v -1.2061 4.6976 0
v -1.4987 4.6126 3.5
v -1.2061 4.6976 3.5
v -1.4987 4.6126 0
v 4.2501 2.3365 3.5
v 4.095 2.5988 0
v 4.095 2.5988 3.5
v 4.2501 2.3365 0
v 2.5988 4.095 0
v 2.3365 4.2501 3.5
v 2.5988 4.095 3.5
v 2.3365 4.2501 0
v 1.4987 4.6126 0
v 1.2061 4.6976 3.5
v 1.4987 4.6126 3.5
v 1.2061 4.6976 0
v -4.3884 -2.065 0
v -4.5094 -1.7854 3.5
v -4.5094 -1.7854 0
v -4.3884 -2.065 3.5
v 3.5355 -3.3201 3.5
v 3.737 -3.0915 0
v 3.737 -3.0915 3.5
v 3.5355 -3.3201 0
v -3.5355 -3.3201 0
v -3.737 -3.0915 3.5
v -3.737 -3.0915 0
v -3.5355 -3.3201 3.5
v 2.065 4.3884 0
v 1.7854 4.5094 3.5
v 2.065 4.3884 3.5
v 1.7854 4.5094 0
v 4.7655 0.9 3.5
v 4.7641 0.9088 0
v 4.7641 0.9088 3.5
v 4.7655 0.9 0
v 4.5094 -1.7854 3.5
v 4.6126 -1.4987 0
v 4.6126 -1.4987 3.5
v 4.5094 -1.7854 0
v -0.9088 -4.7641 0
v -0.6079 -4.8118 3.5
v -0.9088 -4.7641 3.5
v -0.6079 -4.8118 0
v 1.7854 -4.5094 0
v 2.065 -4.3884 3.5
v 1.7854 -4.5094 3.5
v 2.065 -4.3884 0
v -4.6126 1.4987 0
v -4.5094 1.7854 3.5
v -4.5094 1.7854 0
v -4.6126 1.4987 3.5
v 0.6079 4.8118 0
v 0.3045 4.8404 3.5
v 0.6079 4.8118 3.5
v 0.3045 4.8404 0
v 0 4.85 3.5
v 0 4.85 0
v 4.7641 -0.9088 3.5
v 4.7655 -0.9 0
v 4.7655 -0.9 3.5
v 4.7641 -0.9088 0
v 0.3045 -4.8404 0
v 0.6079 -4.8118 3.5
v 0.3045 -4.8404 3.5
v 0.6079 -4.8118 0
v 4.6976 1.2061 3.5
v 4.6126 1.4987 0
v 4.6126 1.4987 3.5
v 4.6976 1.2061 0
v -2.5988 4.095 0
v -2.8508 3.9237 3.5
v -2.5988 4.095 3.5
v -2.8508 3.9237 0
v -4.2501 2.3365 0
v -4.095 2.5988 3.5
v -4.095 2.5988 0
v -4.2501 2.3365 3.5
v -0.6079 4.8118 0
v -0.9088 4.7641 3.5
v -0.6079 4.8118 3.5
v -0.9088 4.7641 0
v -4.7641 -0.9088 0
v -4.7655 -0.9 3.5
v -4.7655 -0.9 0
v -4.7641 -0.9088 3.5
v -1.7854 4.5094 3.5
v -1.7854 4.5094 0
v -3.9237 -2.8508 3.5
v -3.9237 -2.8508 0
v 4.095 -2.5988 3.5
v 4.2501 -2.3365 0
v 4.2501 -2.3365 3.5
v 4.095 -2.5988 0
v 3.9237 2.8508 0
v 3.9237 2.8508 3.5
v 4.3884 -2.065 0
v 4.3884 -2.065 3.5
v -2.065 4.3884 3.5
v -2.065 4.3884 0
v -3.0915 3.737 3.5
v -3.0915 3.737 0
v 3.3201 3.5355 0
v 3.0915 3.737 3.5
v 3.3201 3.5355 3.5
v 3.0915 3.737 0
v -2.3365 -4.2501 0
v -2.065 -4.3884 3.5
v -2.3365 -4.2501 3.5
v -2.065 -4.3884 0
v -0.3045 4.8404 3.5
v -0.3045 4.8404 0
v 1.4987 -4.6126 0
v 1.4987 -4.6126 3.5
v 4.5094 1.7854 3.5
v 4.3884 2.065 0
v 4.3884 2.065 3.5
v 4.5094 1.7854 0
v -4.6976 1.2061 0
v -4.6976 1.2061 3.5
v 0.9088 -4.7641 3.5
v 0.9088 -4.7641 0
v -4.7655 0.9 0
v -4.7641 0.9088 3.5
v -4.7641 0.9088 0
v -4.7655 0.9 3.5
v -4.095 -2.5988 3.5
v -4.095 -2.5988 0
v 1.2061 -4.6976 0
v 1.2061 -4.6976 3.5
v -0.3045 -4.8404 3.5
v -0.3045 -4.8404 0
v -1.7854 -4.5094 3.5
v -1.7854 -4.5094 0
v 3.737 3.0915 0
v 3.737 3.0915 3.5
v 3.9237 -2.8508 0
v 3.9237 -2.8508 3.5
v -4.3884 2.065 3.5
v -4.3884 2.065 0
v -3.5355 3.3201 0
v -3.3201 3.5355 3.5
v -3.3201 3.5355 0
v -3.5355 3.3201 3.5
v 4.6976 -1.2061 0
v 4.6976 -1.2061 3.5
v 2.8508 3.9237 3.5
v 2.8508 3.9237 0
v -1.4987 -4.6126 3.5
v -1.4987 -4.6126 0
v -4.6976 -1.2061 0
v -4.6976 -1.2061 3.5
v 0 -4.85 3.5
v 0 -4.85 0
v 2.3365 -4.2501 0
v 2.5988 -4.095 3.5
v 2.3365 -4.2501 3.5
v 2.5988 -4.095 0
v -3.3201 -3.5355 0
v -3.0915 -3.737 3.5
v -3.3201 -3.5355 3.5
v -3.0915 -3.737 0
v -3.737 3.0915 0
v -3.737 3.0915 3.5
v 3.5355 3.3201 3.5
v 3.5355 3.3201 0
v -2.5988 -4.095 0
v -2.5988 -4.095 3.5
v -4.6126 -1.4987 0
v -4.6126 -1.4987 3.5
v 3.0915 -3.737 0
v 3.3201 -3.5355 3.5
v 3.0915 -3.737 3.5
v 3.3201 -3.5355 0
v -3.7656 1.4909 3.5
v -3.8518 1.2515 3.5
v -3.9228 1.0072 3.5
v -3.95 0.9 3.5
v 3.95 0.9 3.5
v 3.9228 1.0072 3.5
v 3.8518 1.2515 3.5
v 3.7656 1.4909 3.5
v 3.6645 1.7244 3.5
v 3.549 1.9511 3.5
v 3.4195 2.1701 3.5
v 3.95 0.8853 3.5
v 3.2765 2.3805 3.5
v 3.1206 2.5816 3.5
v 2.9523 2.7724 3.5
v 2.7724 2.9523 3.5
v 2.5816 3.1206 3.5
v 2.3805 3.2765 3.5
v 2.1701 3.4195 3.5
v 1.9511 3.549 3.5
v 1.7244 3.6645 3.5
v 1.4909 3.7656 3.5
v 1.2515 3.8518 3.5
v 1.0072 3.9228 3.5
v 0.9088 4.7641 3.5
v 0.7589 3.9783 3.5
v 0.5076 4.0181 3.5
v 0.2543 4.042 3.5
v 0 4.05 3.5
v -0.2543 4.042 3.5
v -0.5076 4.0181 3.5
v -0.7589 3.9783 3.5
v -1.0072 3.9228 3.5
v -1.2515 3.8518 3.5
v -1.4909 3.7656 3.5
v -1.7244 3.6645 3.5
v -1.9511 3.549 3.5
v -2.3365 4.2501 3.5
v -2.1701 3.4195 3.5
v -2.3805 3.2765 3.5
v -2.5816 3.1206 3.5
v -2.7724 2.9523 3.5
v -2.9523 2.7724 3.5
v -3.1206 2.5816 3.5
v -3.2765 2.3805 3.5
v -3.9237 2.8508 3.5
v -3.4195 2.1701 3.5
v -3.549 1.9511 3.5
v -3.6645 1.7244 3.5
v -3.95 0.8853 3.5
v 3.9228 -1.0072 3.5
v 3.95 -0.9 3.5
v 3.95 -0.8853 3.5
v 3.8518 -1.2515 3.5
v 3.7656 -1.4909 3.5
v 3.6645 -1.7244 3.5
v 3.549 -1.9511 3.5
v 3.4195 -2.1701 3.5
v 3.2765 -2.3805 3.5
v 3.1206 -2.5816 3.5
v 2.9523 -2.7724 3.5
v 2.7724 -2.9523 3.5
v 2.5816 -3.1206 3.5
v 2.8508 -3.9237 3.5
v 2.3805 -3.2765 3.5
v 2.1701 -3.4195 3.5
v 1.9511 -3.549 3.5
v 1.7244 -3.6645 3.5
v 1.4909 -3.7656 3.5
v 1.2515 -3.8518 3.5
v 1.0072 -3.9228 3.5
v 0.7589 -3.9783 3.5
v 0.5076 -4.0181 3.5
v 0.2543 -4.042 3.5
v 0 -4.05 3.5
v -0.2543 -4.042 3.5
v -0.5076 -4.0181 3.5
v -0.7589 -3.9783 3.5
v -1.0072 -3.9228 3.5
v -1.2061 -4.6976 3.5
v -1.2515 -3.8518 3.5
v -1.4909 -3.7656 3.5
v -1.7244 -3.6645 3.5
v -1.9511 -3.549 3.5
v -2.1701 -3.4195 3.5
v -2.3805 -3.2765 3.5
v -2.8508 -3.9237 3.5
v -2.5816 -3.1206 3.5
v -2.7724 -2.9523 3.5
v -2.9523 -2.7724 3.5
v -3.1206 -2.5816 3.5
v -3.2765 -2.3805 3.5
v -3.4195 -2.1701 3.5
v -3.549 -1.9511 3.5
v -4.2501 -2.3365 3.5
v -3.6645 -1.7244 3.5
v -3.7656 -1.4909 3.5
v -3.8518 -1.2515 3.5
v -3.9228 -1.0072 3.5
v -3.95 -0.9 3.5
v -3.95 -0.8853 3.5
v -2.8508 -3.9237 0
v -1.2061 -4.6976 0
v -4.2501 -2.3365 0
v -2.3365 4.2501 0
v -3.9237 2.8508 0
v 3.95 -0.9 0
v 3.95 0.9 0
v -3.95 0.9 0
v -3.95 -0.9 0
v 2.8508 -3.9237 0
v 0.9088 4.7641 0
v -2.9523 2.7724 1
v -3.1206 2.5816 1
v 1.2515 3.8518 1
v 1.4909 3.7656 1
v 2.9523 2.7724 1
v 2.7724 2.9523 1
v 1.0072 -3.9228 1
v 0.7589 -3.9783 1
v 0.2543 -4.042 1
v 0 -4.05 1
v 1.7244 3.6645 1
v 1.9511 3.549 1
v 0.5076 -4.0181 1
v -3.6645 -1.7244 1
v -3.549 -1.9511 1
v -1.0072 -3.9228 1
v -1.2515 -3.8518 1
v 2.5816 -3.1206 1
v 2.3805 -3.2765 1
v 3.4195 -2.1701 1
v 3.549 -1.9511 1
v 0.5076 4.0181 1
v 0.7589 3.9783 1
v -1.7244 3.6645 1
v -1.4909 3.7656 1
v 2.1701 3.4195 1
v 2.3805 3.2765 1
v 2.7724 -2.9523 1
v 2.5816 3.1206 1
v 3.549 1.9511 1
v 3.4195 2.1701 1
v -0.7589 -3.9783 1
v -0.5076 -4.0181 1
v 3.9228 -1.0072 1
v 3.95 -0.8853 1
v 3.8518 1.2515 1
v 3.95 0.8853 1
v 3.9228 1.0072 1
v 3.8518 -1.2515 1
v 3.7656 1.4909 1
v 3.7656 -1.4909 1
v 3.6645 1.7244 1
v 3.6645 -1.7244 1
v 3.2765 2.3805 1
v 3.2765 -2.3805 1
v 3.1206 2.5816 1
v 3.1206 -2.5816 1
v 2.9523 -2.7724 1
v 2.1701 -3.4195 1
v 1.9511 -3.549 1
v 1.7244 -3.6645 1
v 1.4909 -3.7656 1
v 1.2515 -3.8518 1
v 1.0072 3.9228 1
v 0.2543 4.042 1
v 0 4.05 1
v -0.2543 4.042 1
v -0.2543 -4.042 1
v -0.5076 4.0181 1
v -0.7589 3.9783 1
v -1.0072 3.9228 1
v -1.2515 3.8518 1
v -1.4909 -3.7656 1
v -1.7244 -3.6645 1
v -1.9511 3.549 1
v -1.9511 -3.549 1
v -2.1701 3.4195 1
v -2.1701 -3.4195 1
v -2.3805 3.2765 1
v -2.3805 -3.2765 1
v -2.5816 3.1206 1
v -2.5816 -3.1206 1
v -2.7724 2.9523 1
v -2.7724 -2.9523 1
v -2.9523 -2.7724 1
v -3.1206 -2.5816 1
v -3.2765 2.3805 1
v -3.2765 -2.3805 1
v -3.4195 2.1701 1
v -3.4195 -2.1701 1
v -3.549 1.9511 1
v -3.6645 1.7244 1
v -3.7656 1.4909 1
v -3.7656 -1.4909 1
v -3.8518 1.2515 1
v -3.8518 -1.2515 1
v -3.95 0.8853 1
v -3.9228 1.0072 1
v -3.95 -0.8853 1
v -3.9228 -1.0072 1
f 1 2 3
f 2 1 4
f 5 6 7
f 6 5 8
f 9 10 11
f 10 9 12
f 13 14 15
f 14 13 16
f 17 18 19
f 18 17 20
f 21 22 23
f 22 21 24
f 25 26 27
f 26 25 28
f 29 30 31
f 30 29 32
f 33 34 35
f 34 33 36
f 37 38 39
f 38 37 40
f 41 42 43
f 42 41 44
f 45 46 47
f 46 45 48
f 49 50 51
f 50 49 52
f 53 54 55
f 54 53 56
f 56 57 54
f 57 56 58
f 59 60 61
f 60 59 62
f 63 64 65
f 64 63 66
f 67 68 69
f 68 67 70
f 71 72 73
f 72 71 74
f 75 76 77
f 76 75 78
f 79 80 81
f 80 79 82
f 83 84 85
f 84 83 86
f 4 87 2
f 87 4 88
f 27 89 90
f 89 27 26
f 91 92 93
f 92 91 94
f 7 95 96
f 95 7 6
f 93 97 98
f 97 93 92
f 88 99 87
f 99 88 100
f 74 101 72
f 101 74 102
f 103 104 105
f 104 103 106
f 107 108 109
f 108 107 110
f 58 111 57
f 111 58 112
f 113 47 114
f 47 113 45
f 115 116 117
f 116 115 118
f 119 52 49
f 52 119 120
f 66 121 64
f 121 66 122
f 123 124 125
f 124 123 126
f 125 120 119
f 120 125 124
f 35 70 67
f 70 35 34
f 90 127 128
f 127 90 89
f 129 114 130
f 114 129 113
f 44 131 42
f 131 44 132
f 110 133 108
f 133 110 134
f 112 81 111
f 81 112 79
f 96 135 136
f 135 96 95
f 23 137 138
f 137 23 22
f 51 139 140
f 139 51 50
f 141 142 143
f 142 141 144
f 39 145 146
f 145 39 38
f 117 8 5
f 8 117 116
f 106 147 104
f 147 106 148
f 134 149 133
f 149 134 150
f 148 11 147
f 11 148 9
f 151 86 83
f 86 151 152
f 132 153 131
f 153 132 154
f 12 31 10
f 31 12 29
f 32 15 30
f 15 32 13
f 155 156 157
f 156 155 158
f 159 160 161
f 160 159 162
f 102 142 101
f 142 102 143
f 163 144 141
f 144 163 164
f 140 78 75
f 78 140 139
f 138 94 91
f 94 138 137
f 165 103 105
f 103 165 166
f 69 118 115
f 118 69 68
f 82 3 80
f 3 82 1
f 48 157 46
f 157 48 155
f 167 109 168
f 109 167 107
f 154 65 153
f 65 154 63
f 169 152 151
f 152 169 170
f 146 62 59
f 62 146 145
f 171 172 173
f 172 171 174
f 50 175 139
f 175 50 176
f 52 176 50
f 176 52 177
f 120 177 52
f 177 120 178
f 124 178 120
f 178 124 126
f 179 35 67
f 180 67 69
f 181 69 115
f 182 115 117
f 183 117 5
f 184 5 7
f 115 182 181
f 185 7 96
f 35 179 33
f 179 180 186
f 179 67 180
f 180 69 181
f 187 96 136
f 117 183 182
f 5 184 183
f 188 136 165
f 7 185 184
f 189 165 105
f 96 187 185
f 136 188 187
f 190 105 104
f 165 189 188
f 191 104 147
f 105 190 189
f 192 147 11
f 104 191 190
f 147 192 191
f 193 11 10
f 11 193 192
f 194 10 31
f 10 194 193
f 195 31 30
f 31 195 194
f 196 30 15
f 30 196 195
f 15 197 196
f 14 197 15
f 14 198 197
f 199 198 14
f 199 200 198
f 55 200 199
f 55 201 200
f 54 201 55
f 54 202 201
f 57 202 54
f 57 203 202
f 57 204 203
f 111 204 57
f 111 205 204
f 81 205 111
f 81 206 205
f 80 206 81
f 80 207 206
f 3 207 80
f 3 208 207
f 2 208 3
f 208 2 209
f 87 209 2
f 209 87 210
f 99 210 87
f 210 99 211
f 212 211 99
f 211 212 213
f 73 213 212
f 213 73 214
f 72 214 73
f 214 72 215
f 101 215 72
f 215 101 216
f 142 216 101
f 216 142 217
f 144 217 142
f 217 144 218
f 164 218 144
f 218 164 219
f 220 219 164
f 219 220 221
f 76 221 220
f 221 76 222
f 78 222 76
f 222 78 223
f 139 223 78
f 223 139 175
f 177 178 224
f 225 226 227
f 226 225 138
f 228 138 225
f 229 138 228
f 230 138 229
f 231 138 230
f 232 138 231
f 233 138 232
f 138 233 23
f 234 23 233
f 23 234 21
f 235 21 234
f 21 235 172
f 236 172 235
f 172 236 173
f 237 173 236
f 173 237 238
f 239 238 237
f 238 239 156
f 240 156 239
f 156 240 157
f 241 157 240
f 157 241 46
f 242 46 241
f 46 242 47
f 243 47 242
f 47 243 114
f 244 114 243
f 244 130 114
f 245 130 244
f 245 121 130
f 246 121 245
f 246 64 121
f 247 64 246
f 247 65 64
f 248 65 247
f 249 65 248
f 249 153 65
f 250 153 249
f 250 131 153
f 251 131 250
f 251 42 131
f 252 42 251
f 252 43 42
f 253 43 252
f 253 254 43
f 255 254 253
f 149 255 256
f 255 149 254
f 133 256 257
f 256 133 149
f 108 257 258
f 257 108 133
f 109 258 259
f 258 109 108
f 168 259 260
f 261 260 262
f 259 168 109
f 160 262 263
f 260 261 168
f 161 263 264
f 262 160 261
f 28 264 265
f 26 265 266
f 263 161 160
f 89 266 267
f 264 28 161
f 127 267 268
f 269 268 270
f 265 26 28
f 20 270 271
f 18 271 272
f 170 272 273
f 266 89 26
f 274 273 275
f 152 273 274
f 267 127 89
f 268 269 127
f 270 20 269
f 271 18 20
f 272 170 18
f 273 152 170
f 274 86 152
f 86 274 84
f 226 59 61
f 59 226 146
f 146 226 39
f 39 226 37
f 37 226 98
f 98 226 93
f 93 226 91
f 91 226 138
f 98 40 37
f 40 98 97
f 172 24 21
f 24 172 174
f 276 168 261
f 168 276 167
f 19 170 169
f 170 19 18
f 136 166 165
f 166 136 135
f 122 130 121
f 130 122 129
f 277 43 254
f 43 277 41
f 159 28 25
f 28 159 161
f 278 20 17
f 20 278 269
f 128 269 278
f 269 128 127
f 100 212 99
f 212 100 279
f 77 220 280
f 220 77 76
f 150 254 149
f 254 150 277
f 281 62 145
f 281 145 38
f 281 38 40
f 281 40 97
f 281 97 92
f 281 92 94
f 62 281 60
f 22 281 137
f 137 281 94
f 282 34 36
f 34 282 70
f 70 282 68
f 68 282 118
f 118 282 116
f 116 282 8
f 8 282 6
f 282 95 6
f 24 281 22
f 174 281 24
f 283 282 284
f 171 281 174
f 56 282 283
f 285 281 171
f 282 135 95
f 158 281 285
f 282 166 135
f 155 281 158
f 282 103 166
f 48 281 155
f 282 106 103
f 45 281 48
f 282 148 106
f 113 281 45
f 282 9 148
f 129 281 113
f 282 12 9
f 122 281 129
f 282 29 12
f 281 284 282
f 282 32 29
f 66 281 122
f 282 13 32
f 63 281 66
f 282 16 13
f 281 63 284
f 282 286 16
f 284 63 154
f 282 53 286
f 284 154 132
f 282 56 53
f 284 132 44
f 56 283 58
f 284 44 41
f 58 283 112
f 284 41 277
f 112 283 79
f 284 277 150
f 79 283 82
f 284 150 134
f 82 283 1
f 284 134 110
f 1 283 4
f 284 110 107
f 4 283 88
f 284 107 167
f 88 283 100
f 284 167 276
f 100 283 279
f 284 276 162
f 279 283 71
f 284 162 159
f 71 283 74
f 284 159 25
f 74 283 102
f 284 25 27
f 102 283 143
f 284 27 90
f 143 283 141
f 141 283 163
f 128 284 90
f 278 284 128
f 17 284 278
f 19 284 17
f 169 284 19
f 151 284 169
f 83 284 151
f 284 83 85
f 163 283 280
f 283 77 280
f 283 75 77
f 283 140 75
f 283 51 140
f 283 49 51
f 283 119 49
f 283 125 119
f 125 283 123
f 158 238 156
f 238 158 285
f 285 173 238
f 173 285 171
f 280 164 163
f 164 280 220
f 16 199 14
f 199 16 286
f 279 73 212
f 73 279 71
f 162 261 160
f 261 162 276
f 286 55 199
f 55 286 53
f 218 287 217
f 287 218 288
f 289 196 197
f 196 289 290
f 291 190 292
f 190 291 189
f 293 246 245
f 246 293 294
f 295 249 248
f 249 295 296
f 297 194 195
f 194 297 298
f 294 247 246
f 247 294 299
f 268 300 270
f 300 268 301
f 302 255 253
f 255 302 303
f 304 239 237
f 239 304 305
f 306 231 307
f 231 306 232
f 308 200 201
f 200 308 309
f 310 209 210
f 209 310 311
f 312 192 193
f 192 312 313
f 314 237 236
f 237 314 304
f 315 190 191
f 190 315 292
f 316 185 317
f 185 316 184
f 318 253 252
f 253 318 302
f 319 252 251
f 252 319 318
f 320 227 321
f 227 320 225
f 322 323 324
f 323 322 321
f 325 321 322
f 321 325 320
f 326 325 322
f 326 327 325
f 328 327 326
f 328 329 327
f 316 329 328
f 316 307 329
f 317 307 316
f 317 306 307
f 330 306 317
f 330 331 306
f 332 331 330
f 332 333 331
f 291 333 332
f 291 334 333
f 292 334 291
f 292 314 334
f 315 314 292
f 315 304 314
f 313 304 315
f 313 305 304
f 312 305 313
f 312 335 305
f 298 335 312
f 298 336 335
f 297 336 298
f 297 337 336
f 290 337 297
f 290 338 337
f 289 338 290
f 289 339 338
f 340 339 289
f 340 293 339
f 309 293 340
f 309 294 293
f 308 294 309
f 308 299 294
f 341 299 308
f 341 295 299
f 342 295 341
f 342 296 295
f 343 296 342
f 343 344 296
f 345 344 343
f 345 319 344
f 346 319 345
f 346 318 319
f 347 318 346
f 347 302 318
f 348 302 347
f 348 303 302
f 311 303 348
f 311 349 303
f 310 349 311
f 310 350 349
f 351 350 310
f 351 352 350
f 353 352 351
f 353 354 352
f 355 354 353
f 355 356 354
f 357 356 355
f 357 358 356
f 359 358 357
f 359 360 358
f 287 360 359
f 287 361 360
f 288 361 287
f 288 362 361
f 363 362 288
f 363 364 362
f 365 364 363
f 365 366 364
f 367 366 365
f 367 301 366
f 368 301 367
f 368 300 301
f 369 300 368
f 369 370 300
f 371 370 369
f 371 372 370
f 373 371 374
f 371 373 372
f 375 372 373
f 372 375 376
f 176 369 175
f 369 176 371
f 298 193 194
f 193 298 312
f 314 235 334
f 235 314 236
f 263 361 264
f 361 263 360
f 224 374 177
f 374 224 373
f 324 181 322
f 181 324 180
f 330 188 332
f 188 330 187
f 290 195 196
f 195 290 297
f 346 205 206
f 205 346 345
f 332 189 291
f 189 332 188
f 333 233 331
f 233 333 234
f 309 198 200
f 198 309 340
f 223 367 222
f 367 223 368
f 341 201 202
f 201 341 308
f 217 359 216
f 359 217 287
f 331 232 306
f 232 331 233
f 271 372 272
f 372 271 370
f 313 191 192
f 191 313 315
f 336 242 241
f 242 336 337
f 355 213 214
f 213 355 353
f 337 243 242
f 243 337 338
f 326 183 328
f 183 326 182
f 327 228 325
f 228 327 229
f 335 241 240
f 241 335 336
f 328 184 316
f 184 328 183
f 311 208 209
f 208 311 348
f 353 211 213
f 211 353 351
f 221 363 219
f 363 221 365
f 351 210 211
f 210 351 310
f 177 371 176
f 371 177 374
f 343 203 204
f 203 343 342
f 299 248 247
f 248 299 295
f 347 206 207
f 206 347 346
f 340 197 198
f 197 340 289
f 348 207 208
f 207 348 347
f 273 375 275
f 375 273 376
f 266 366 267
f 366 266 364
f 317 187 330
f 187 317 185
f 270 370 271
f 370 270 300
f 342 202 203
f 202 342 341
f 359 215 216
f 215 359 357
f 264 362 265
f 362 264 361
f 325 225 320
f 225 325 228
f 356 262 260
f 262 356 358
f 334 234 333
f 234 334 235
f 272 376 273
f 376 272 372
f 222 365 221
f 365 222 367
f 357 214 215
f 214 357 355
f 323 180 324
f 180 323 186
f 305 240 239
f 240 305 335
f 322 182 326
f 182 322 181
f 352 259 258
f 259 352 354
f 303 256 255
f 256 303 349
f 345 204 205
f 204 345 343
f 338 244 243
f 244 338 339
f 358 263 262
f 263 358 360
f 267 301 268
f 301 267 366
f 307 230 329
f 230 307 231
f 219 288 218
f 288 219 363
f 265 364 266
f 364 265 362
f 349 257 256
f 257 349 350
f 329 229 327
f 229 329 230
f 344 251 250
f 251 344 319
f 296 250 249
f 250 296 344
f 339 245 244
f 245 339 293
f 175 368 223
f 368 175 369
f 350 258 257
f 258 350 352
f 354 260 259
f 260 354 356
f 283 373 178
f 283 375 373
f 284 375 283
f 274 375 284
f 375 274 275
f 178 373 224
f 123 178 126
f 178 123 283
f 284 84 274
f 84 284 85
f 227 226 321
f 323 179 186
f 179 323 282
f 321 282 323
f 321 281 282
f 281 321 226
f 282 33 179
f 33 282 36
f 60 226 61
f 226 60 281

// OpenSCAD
use <MCAD/boxes.scad>

// box setup
bb_size = 15;
space_uv_w = 220;
space_uv_h = 160;
space_uv_z = 110;
space_ec_w = 75;
mh_pitch = 15;
cover_frame_size = 2;

// mount holes
mh_inner_dia = 3;
mh_out_dia = 10;
mh_out_h = 3.5;
mh_x_positions = [1, 2, 3, 4, 5, 7.2, 8.2, 9.2, 10.2, 11.2, 12.2, 13.2, 14.35, 15.5, 16.5, 17.5, 18.5, 19.5, 20.5];
mh_y_positions = [1, 2, 3, 4, 5, 6, 7, 8, 9, 10, 11];

top_cover_z = 25;
top_cover_plate_z = 4;


total_w = space_uv_w+space_ec_w+3*bb_size;
total_h = space_uv_h+2*bb_size;
total_z = space_uv_z+top_cover_z+2*bb_size;


//bottom_plate(1);
//translate([0, 0, bb_size+2]) bottom_plate(-1);

//translate([total_w/2-bb_size, total_h/-2, bb_size/-2]) right_zbar();
//translate([total_w/-2+space_ec_w+bb_size, total_h/-2, -bb_size/2]) middle_zbar();
//translate([total_w/-2+space_ec_w+bb_size, total_h/2, -bb_size/2]) mirror([0, 1, 0]) middle_zbar();

//translate([total_w/-2, total_h/-2, bb_size/-2]) left_zbar();

//translate([total_w/-2+(space_ec_w+2*bb_size)/2, 0, total_z-bb_size]) top_plate();

//translate([0, 0, total_z-top_cover_z-bb_size+1]) uv_plate();
//translate([0, 0, total_z-top_cover_z-bb_size+1]) uv_plate(2);

//translate([-19.5, total_h/2+0.1, total_z-top_cover_z-bb_size/2+5.1]) rotate(a=[0, 90, 90]) import("test_hinge.stl");

//hinge_washer();

mount_hole_cover();

module mount_hole_cover() {
    difference() {
        cylinder(d=mh_out_dia-0.3, h=mh_out_h, $fn=100);
        translate([0, 0, 1]) cylinder(d=mh_out_dia-0.3-1.6, h=mh_out_h, $fn=100);
        translate([(mh_out_dia-0.3)/-2, 0, 0]) cube(size=[1.8, 1.8, mh_out_h*3], center=true);
        translate([(mh_out_dia-0.3)/2, 0, 0]) cube(size=[1.8, 1.8, mh_out_h*3], center=true);

    }
}

module hinge_washer() {
    hinge_w = 30;
    hinge_d = 4;
    washer_d = bb_size/2-hinge_d;
    hinge_down_cutoff = 2;

    difference() {        
        union() {
            cube(size=[hinge_w, bb_size, washer_d]);
            cube(size=[hinge_w, hinge_down_cutoff, bb_size/2]);
            translate([0, -cover_frame_size, bb_size/2-cover_frame_size]) cube(size=[hinge_w, cover_frame_size+hinge_down_cutoff, cover_frame_size]);
        }

        translate([hinge_w/2-mh_pitch/2, bb_size/2, -1]) cylinder(d=3.5, h=washer_d+2, $fn=100);
        translate([hinge_w/2+mh_pitch/2, bb_size/2, -1]) cylinder(d=3.5, h=washer_d+2, $fn=100);

    }
}

module uv_plate(cut_side=1) {
    uvp_w = space_uv_w + 2*bb_size;

    difference() {
        translate([space_ec_w/2+bb_size/2, 0, 0]) difference() {
            union() {
                cube(size=[uvp_w, total_h, bb_size], center=true);
                // cover frames
                translate([0, total_h/-2+cover_frame_size/2, cover_frame_size/-2]) cube(size=[uvp_w, cover_frame_size, bb_size+cover_frame_size], center=true);
                translate([0, total_h/2-cover_frame_size/2, cover_frame_size/-2]) cube(size=[uvp_w, cover_frame_size, bb_size+cover_frame_size], center=true);
                translate([uvp_w/2-cover_frame_size/2, 0, cover_frame_size/-2]) cube(size=[cover_frame_size, total_h, bb_size+cover_frame_size], center=true);

            }
            cube(size=[space_uv_w, space_uv_h, bb_size+2], center=true);
        }

        // mounting holes              
        for (i = mh_x_positions) {
            translate([total_w/-2 + mh_out_dia/2 + i*mh_pitch, total_h/-2+bb_size+1, 0]) rotate(a=[90, 0, 0]) mounting_hole();
            translate([total_w/-2 + mh_out_dia/2 + i*mh_pitch, total_h/2+1, 0]) rotate(a=[90, 0, 0]) mounting_hole();
        }
        for (i = mh_y_positions) {
            translate([total_w/-2-1, total_h/-2+mh_out_dia/2 + i*mh_pitch, 0]) rotate(a=[90, 0, 90]) mounting_hole();
            translate([total_w/-2-1+bb_size+space_ec_w, total_h/-2+mh_out_dia/2 + i*mh_pitch, 0]) rotate(a=[90, 0, 90]) mounting_hole();
            translate([total_w/2-1-bb_size, total_h/-2+mh_out_dia/2 + i*mh_pitch, 0]) rotate(a=[90, 0, 90]) mounting_hole();
        }

        // cut corners
        translate([17*mh_pitch+mh_out_dia/2-0.5, total_h/2, 0]) cube(size=[total_w, bb_size, bb_size+10], center=true); 
        translate([19*mh_pitch+mh_out_dia/2-0.5, total_h/-2, 0]) cube(size=[total_w, bb_size, bb_size+10], center=true); 
        zbar_h = 2.5*mh_pitch + mh_out_dia/2;
        translate([total_w/2, total_h/-2+zbar_h/2-1]) cube(size=[bb_size, zbar_h+2, bb_size+5], center=true);
        translate([total_w/2, total_h/2-zbar_h/2+1]) cube(size=[bb_size, zbar_h+2, bb_size+5], center=true);
        lp_cut_w = 7.2*mh_pitch + 0.5*mh_pitch + mh_out_dia/2;
        translate([total_w/-2+lp_cut_w/2, total_h/-2, 0]) cube(size=[lp_cut_w, bb_size, bb_size+5], center=true);
        translate([total_w/-2+lp_cut_w/2, total_h/2, 0]) cube(size=[lp_cut_w, bb_size, bb_size+5], center=true);
        lp_cut_h = 1.5*mh_pitch + mh_out_dia/2+0.5;
        translate([total_w/-2+bb_size+space_ec_w, total_h/-2+lp_cut_h/2, 0]) cube(size=[bb_size, lp_cut_h, bb_size+5], center=true);
        translate([total_w/-2+bb_size+space_ec_w, total_h/2-lp_cut_h/2, 0]) cube(size=[bb_size, lp_cut_h, bb_size+5], center=true);
        // left hinge
        hinge_w = 2*mh_pitch+1;
        translate([total_w/-2+hinge_w/2+(8.2+0.5)*mh_pitch+mh_out_dia/2-0.5, total_h/2, 0]) cube(size=[hinge_w, bb_size, bb_size+5], center=true);

        // cut sides
        if (cut_side==1) {
            translate([(15.5+0.5)*mh_pitch+mh_out_dia/2, 0, 0]) cube(size=[total_w, total_h+2, bb_size+10], center=true);
            translate([(12.2+0.5)*mh_pitch+mh_out_dia/2-0.5, total_h/-2, 0]) cube(size=[total_w, bb_size, bb_size+10], center=true);
            translate([(12.2+0.5)*mh_pitch+mh_out_dia/2-0.5, total_h/2, 0]) cube(size=[total_w, bb_size, bb_size+10], center=true);
        }
        else {
            left_w = (12.2+0.5)*mh_pitch+mh_out_dia/2;
            translate([total_w/-2+left_w/2, 0, 0]) cube(size=[left_w, total_h+2, bb_size+10], center=true);
            translate([(total_w-((15.5+0.5)*mh_pitch+mh_out_dia/2))*-1+0.5, total_h/-2+bb_size, 0]) cube(size=[total_w, bb_size, bb_size+10], center=true);
            translate([(total_w-((15.5+0.5)*mh_pitch+mh_out_dia/2))*-1+0.5, total_h/+2-bb_size, 0]) cube(size=[total_w, bb_size, bb_size+10], center=true);

        }
    }
}

module top_plate() {
    tp_w = space_ec_w + 2*bb_size;
    difference() {
        union() {
            difference() {
                union() {
                    cube(size=[tp_w, total_h, bb_size], center=true);
                    // cover frames
                    translate([0, total_h/-2+cover_frame_size/2, cover_frame_size/-2]) cube(size=[tp_w, cover_frame_size, bb_size+cover_frame_size], center=true);
                    translate([0, total_h/2-cover_frame_size/2, cover_frame_size/-2]) cube(size=[tp_w, cover_frame_size, bb_size+cover_frame_size], center=true);
                    translate([tp_w/-2+cover_frame_size/2, 0, cover_frame_size/-2]) cube(size=[cover_frame_size, total_h, bb_size+cover_frame_size], center=true);
                    translate([tp_w/2-cover_frame_size/2, 0, cover_frame_size/-2]) cube(size=[cover_frame_size, total_h, bb_size+cover_frame_size], center=true);

                }
                cube(size=[space_ec_w, space_uv_h, bb_size+2], center=true);

                // mount holes
                for (i = mh_x_positions) {
                    translate([tp_w/-2 + mh_out_dia/2 + i*mh_pitch, total_h/-2+bb_size+1, 0]) rotate(a=[90, 0, 0]) mounting_hole();
                    translate([tp_w/-2 + mh_out_dia/2 + i*mh_pitch, total_h/2+1, 0]) rotate(a=[90, 0, 0]) mounting_hole();
                }
                for (i = mh_y_positions) {
                    translate([tp_w/-2-1, total_h/-2+mh_out_dia/2 + i*mh_pitch, 0]) rotate(a=[90, 0, 90]) mounting_hole();
                    translate([tp_w/-2-1+bb_size+space_ec_w, total_h/-2+mh_out_dia/2 + i*mh_pitch, 0]) rotate(a=[90, 0, 90]) mounting_hole();            
                }
            }
            // top cover frames
            translate([0, total_h/-2+bb_size/2+cover_frame_size/2, bb_size/2-cover_frame_size/2]) cube(size=[tp_w, bb_size+cover_frame_size, cover_frame_size], center=true);
            translate([0, total_h/2-bb_size/2-cover_frame_size/2, bb_size/2-cover_frame_size/2]) cube(size=[tp_w, bb_size+cover_frame_size, cover_frame_size], center=true);
            translate([tp_w/-2+bb_size/2+cover_frame_size/2, 0, bb_size/2-cover_frame_size/2]) cube(size=[bb_size+cover_frame_size, total_h, cover_frame_size], center=true);
            translate([tp_w/2-bb_size/2-cover_frame_size/2, 0, bb_size/2-cover_frame_size/2]) cube(size=[bb_size+cover_frame_size, total_h, cover_frame_size], center=true);

        }

        // cut outs
        // left
        l_w = 2.5*mh_pitch+mh_out_dia/2;
        l_h = 2.5*mh_pitch + mh_out_dia/2;
        translate([tp_w/-2+(l_w+1)/2-1, total_h/-2, 0]) cube(size=[l_w+1, bb_size, bb_size+5], center=true); 
        translate([tp_w/-2+(l_w+1)/2-1, total_h/2, 0]) cube(size=[l_w+1, bb_size, bb_size+5], center=true); 
        translate([tp_w/-2, total_h/-2+(l_h+1)/2-1, 0]) cube(size=[bb_size, l_h+1, bb_size+5], center=true);
        translate([tp_w/-2, total_h/2-(l_h+1)/2+1, 0]) cube(size=[bb_size, l_h+1, bb_size+5], center=true);
        // right
        uvec_zbar_w = 2.2*mh_pitch+1.5*mh_out_dia;
        translate([tp_w/-2+uvec_zbar_w/2+5*mh_pitch-mh_out_dia/4, total_h/-2+(bb_size/2+1)/2-1, 0]) cube(size=[uvec_zbar_w, bb_size/2+1, bb_size+5], center=true);
        translate([tp_w/-2+uvec_zbar_w/2+5*mh_pitch-mh_out_dia/4, total_h/2-(bb_size/2+1)/2+1, 0]) cube(size=[uvec_zbar_w, bb_size/2+1, bb_size+5], center=true);
        r_h = 1.5*mh_pitch+mh_out_dia/2+0.5;
        translate([tp_w/2, total_h/-2 + r_h/2, 0]) cube(size=[bb_size, r_h, bb_size+5], center=true);
        translate([tp_w/2, total_h/2 - r_h/2, 0]) cube(size=[bb_size, r_h, bb_size+5], center=true);
        // tamper switch
        ts_w = 3*mh_pitch;
        translate([tp_w/2-bb_size, total_h/-2+ts_w/2+2.5*mh_pitch+mh_out_dia/2, 0]) cube(size=[bb_size, ts_w, bb_size+5], center=true);
    }
}

module left_zbar() {
    zbar_w = 2.5*mh_pitch+mh_out_dia/2 - 0.5;
    zbar_h = 2.5*mh_pitch + mh_out_dia/2 - 0.5;
    
    difference() {   
        // base shape
        union() {
            cube(size=[bb_size, bb_size, total_z]);
            cube(size=[zbar_w, bb_size, bb_size]);
            cube(size=[bb_size, zbar_h, bb_size]);
            translate([0, 0, total_z-bb_size]) cube(size=[zbar_w, bb_size, bb_size]);
            translate([0, 0, total_z-bb_size]) cube(size=[bb_size, zbar_h, bb_size]);
            
            // cover frames
            // front
            cube(size=[zbar_w, cover_frame_size, cover_frame_size+bb_size]);
            cube(size=[bb_size+cover_frame_size, cover_frame_size, total_z]);
            translate([0, 0, total_z-bb_size-cover_frame_size]) cube(size=[zbar_w, cover_frame_size, bb_size+cover_frame_size]);
            // side
            cube(size=[cover_frame_size, zbar_h, bb_size+cover_frame_size]);
            cube(size=[cover_frame_size, bb_size+cover_frame_size, total_z]);
            translate([0, 0, total_z-bb_size-cover_frame_size]) cube(size=[cover_frame_size, zbar_h, bb_size+cover_frame_size]);

        }

        // mount holes
        // bottom x
        translate([mh_out_dia/2 + 1*mh_pitch, bb_size+1, bb_size/2]) rotate(a=[90, 0, 0]) mounting_hole();
        translate([mh_out_dia/2 + 2*mh_pitch, bb_size+1, bb_size/2]) rotate(a=[90, 0, 0]) mounting_hole();
        // top x
        translate([mh_out_dia/2 + 1*mh_pitch, bb_size+1, total_z-bb_size/2]) rotate(a=[90, 0, 0]) mounting_hole();
        translate([mh_out_dia/2 + 2*mh_pitch, bb_size+1, total_z-bb_size/2]) rotate(a=[90, 0, 0]) mounting_hole();
        // bottom y
        translate([-1, mh_out_dia/2 + 1*mh_pitch, bb_size/2]) rotate(a=[90, 0, 90]) mounting_hole();
        translate([-1, mh_out_dia/2 + 2*mh_pitch, bb_size/2]) rotate(a=[90, 0, 90]) mounting_hole();
        // top y
        translate([-1, mh_out_dia/2 + 1*mh_pitch, total_z-bb_size/2]) rotate(a=[90, 0, 90]) mounting_hole();
        translate([-1, mh_out_dia/2 + 2*mh_pitch, total_z-bb_size/2]) rotate(a=[90, 0, 90]) mounting_hole();

        // cut sides
        translate([bb_size/2, bb_size/2, -1]) cube(size=[zbar_w, bb_size/2+1, , bb_size+1.5]);
        translate([bb_size/2, bb_size/2, -1]) cube(size=[bb_size/2+1, zbar_h, bb_size+1.5]);
        translate([bb_size/2, bb_size/2, total_z-bb_size-0.5]) cube(size=[zbar_w, bb_size/2+1, , bb_size+1.5]);
        translate([bb_size/2, bb_size/2, total_z-bb_size-0.5]) cube(size=[bb_size/2+1, zbar_h, bb_size+1.5]);

    }
}

module middle_zbar() {
    uvec_zbar_w = 2.2*mh_pitch+1.5*mh_out_dia-1;
    difference () {
        union() {
            // base
            translate([0, 0, 0]) cube(size=[bb_size, bb_size, total_z]);
            translate([5*mh_pitch-mh_out_dia/4 - bb_size - space_ec_w+0.5, 0, 0]) cube(size=[uvec_zbar_w, bb_size, bb_size]);
            translate([5*mh_pitch-mh_out_dia/4 - bb_size - space_ec_w+0.5, 0, total_z-bb_size]) cube(size=[uvec_zbar_w/2, bb_size, bb_size]);
            translate([5*mh_pitch-mh_out_dia/4 - bb_size - space_ec_w+0.5, 0, total_z-top_cover_z-bb_size]) difference() {
                union() {
                    cube(size=[uvec_zbar_w, bb_size, bb_size]);
                    // cover frame - front / uv / top
                    translate([0, 0, -cover_frame_size]) cube(size=[uvec_zbar_w, cover_frame_size, bb_size+cover_frame_size]);
                }
                translate([-1, -1, -1-cover_frame_size]) cube(size=[uvec_zbar_w/2, bb_size+2, bb_size+2+cover_frame_size]);
            }
            translate([0, 0, total_z-top_cover_z-bb_size]) cube(size=[bb_size, mh_pitch*1.5+mh_out_dia/2, bb_size]);
            translate([0, 0, total_z-bb_size]) cube(size=[bb_size, mh_pitch*1.5+mh_out_dia/2, bb_size]);
            
            // cover frames
            // bottom
            translate([5*mh_pitch-mh_out_dia/4 - bb_size - space_ec_w+0.5, 0, 0]) cube(size=[uvec_zbar_w, cover_frame_size, cover_frame_size+bb_size]);
            // front / ec
            translate([-cover_frame_size, 0, 0]) cube(size=[bb_size, cover_frame_size, total_z]);
            // front / ec /top
            translate([5*mh_pitch-mh_out_dia/4 - bb_size - space_ec_w+0.5, 0, total_z-bb_size-cover_frame_size]) cube(size=[uvec_zbar_w/2, cover_frame_size, cover_frame_size+bb_size]);
            // front / uv
            translate([0, 0, 0]) cube(size=[bb_size+cover_frame_size, cover_frame_size, total_z-top_cover_z]);
            // ec / uv space
            translate([bb_size - cover_frame_size, 0, 0]) cube(size=[cover_frame_size, bb_size+cover_frame_size, total_z]);
            // top insidec space
            
            translate([bb_size-cover_frame_size, 0, total_z-cover_frame_size-bb_size]) cube(size=[cover_frame_size, mh_pitch*1.5+mh_out_dia/2, cover_frame_size+bb_size]);
            
        }

        // mount holes
        // bottom
        translate([-space_ec_w-bb_size+mh_out_dia/2+5*mh_pitch, bb_size+1, bb_size/2]) rotate(a=[90, 0, 0]) mounting_hole();
        translate([-space_ec_w-bb_size+mh_out_dia/2+7.2*mh_pitch, bb_size+1, bb_size/2]) rotate(a=[90, 0, 0]) mounting_hole();
        // top x
        translate([-space_ec_w-bb_size+mh_out_dia/2+5*mh_pitch, bb_size+1, total_z-bb_size/2]) rotate(a=[90, 0, 0]) mounting_hole();
        // middle x
        translate([-space_ec_w-bb_size+mh_out_dia/2+7.2*mh_pitch, bb_size+1, total_z-top_cover_z-bb_size/2]) rotate(a=[90, 0, 0]) mounting_hole();
        // top y
        translate([-1, mh_out_dia/2+1*mh_pitch, total_z-bb_size/2]) rotate(a=[90, 0, 90]) mounting_hole();
        // middle y
        translate([-1, mh_out_dia/2+1*mh_pitch, total_z-top_cover_z-bb_size/2]) rotate(a=[90, 0, 90]) mounting_hole();
        
        // cut sides
        // bottom
        translate([5*mh_pitch-mh_out_dia/4 - bb_size - space_ec_w-1, bb_size/2, -1]) cube(size=[uvec_zbar_w+2, bb_size, bb_size+1.5]);
        // middle
        translate([bb_size/2, bb_size/2, total_z-top_cover_z-bb_size-0.5]) cube(size=[uvec_zbar_w, bb_size+1.5*mh_pitch, bb_size+1]);
        // top
        translate([-total_w, bb_size/2, total_z-bb_size-0.5]) cube(size=[total_w+bb_size/2, bb_size+1.5*mh_pitch, bb_size+2]);

    }
    
}

module right_zbar() {
    zbar_z = total_z - top_cover_z;
    zbar_w = 2.5*mh_pitch-mh_out_dia+(total_w-20.5*mh_pitch-mh_out_dia);
    zbar_h = 2.5*mh_pitch + mh_out_dia/2;
    
    difference() {
        // base zbar shape
        union() {
            cube(size=[bb_size, bb_size, zbar_z]);
            translate([-zbar_w+bb_size+0.5, 0, 0]) cube(size=[zbar_w-0.5, bb_size, bb_size]);
            cube(size=[bb_size, zbar_h-0.5, bb_size]);
            translate([-zbar_w+bb_size+0.5, 0, zbar_z-bb_size]) cube(size=[zbar_w-0.5, bb_size, bb_size]);
            translate([0, 0, zbar_z-bb_size]) cube(size=[bb_size, zbar_h-0.5, bb_size]);
            
            // cover frames
            translate([-zbar_w+bb_size+0.5, 0, 0]) cube(size=[zbar_w-0.5, cover_frame_size, bb_size+cover_frame_size]);
            translate([-zbar_w+bb_size+0.5, 0, zbar_z-bb_size-cover_frame_size]) cube(size=[zbar_w-0.5, cover_frame_size, bb_size+cover_frame_size]);
            translate([-cover_frame_size, 0, 0]) cube(size=[cover_frame_size+bb_size, cover_frame_size, zbar_z]);
            translate([bb_size-cover_frame_size, 0, 0]) cube(size=[cover_frame_size, bb_size+cover_frame_size, zbar_z]);
            translate([bb_size-cover_frame_size, 0, 0]) cube(size=[cover_frame_size, zbar_h-0.5, bb_size+cover_frame_size]);
            translate([bb_size-cover_frame_size, 0, zbar_z-bb_size-cover_frame_size]) cube(size=[cover_frame_size, zbar_h-0.5, bb_size+cover_frame_size]);
        }
        
        // mount holes
        // x z1
        translate([19.5*mh_pitch-(total_w-zbar_w)-zbar_w+bb_size+mh_out_dia/2, bb_size+1, bb_size/2]) rotate(a=[90, 0, 0]) mounting_hole();
        translate([20.5*mh_pitch-(total_w-zbar_w)-zbar_w+bb_size+mh_out_dia/2, bb_size+1, bb_size/2]) rotate(a=[90, 0, 0]) mounting_hole();
        // x z2
        translate([19.5*mh_pitch-(total_w-zbar_w)-zbar_w+bb_size+mh_out_dia/2, bb_size+1, bb_size/-2+zbar_z]) rotate(a=[90, 0, 0]) mounting_hole();
        translate([20.5*mh_pitch-(total_w-zbar_w)-zbar_w+bb_size+mh_out_dia/2, bb_size+1, bb_size/-2+zbar_z]) rotate(a=[90, 0, 0]) mounting_hole();
        // y z1
        translate([-1, mh_out_dia/2+1*mh_pitch, bb_size/2]) rotate(a=[90, 0, 90]) mounting_hole();
        translate([-1, mh_out_dia/2+2*mh_pitch, bb_size/2]) rotate(a=[90, 0, 90]) mounting_hole();
        // y z2
        translate([-1, mh_out_dia/2+1*mh_pitch, bb_size/-2+zbar_z]) rotate(a=[90, 0, 90]) mounting_hole();
        translate([-1, mh_out_dia/2+2*mh_pitch, bb_size/-2+zbar_z]) rotate(a=[90, 0, 90]) mounting_hole();
        
        // bottom split
        translate([-zbar_w-1, bb_size/2, -1]) cube(size=[zbar_w+1+bb_size/2, bb_size/2+1, bb_size+1.5]);
        translate([-1, bb_size/2, -1]) cube(size=[1+bb_size/2, zbar_h+1, bb_size+1.5]);
        translate([-zbar_w-1, bb_size/2, zbar_z-bb_size-1]) cube(size=[zbar_w+1+bb_size/2, bb_size/2+1, bb_size+1.5]);
        translate([-1, bb_size/2, zbar_z-bb_size-1]) cube(size=[1+bb_size/2, zbar_h+1, bb_size+1.5]);
    }
}

module bottom_plate(cut_side=1) {
    difference() {
        union() {
            difference() {
                cube(size=[total_w, total_h, bb_size], center=true);
                translate([total_w/-2+space_ec_w/2+bb_size, 0, 0]) cube(size=[space_ec_w, space_uv_h, bb_size+2], center=true);
                translate([total_w/2-space_uv_w/2-bb_size, 0, 0]) cube(size=[space_uv_w, space_uv_h, bb_size+2], center=true);
                
                // mounting holes              
                for (i = mh_x_positions) {
                    translate([total_w/-2 + mh_out_dia/2 + i*mh_pitch, total_h/-2+bb_size+1, 0]) rotate(a=[90, 0, 0]) mounting_hole();
                    translate([total_w/-2 + mh_out_dia/2 + i*mh_pitch, total_h/2+1, 0]) rotate(a=[90, 0, 0]) mounting_hole();
                }
                for (i = mh_y_positions) {
                    translate([total_w/-2-1, total_h/-2+mh_out_dia/2 + i*mh_pitch, 0]) rotate(a=[90, 0, 90]) mounting_hole();
                    translate([total_w/-2-1+bb_size+space_ec_w, total_h/-2+mh_out_dia/2 + i*mh_pitch, 0]) rotate(a=[90, 0, 90]) mounting_hole();
                    translate([total_w/2-1-bb_size, total_h/-2+mh_out_dia/2 + i*mh_pitch, 0]) rotate(a=[90, 0, 90]) mounting_hole();
                }
            }
            
            // frames for covers
            translate([0, total_h/-2+(bb_size+cover_frame_size)/2, bb_size/-2+cover_frame_size/2]) cube(size=[total_w, bb_size+cover_frame_size, cover_frame_size], center=true);
            translate([0, total_h/2-(bb_size+cover_frame_size)/2, bb_size/-2+cover_frame_size/2]) cube(size=[total_w, bb_size+cover_frame_size, cover_frame_size], center=true);
            translate([total_w/-2+(bb_size+cover_frame_size)/2, 0, bb_size/-2+cover_frame_size/2]) cube(size=[bb_size+cover_frame_size, total_h, cover_frame_size], center=true);
            translate([total_w/2-(bb_size+cover_frame_size)/2, 0, bb_size/-2+cover_frame_size/2]) cube(size=[bb_size+cover_frame_size, total_h, cover_frame_size], center=true);
            translate([total_w/-2+(bb_size+2*cover_frame_size)/2+space_ec_w+bb_size-cover_frame_size, 0, bb_size/-2+cover_frame_size/2]) cube(size=[bb_size+2*cover_frame_size, total_h, cover_frame_size], center=true);
            translate([0, total_h/-2+cover_frame_size/2, bb_size/2+(cover_frame_size+1)/2-1]) cube(size=[total_w, cover_frame_size, 1+cover_frame_size], center=true);
            translate([0, total_h/2-cover_frame_size/2, bb_size/2+(cover_frame_size+1)/2-1]) cube(size=[total_w, cover_frame_size, 1+cover_frame_size], center=true);
            translate([total_w/-2+cover_frame_size/2, 0, bb_size/2+(cover_frame_size+1)/2-1]) cube(size=[cover_frame_size, total_h, 1+cover_frame_size], center=true);
            translate([total_w/2-cover_frame_size/2, 0, bb_size/2+(cover_frame_size+1)/2-1]) cube(size=[cover_frame_size, total_h, 1+cover_frame_size], center=true);
        }
        
        // cutting sides for mounting Z bars
        // LF corner
        lf1_w = 2.5*mh_pitch+mh_out_dia/2;
        translate([total_w/-2+(lf1_w+1)/2-1, total_h/-2+(bb_size/2+1)/2-1, 0]) cube(size=[lf1_w+1, bb_size/2+1, bb_size+5], center=true);
        lf1_h = 2.5*mh_pitch + mh_out_dia/2;
        translate([total_w/-2+(bb_size/2+1)/2-1, total_h/-2+(lf1_h+1)/2-1, 0]) cube(size=[bb_size/2+1, lf1_h+1, bb_size+5], center=true);
        // LB corner
        translate([total_w/-2+(lf1_w+1)/2-1, total_h/2-(bb_size/2+1)/2+1, 0]) cube(size=[lf1_w+1, bb_size/2+1, bb_size+5], center=true);
        translate([total_w/-2+(bb_size/2+1)/2-1, total_h/2-(lf1_h+1)/2+1, 0]) cube(size=[bb_size/2+1, lf1_h+1, bb_size+5], center=true);
        // RF corner
        rf1_w = 2.5*mh_pitch-mh_out_dia+(total_w-20.5*mh_pitch-mh_out_dia);
        translate([total_w/2-(rf1_w+1)/2+1, total_h/-2+(bb_size/2+1)/2-1, 0]) cube(size=[rf1_w+1, bb_size/2+1, bb_size+5], center=true);
        translate([total_w/2-(bb_size/2+1)/2+1, total_h/-2+(lf1_h+1)/2-1, 0]) cube(size=[bb_size/2+1, lf1_h+1, bb_size+5], center=true);
        // RB corner
        translate([total_w/2-(rf1_w+1)/2+1, total_h/2-(bb_size/2+1)/2+1, 0]) cube(size=[rf1_w+1, bb_size/2+1, bb_size+5], center=true);
        translate([total_w/2-(bb_size/2+1)/2+1, total_h/2-(lf1_h+1)/2+1, 0]) cube(size=[bb_size/2+1, lf1_h+1, bb_size+5], center=true);
        
        // UV / EC Z bar
        uvec_zbar_w = 2.2*mh_pitch+1.5*mh_out_dia;
        translate([total_w/-2+uvec_zbar_w/2+5*mh_pitch-mh_out_dia/4, total_h/-2+(bb_size/2+1)/2-1, 0]) cube(size=[uvec_zbar_w, bb_size/2+1, bb_size+5], center=true);
        translate([total_w/-2+uvec_zbar_w/2+5*mh_pitch-mh_out_dia/4, total_h/2-(bb_size/2+1)/2+1, 0]) cube(size=[uvec_zbar_w, bb_size/2+1, bb_size+5], center=true);
        
        // split on two parts
        cut_margin_r = 19+mh_pitch/2;
        cut_margin_l = 13+mh_pitch/2;
        if(cut_side==1) {            
            translate([total_w/2+cut_margin_r, 0, 0]) cube(size=[total_w, total_h+2, bb_size+5], center=true);
            translate([total_w/2-cut_margin_l, 0, 0]) cube(size=[total_w, total_h-bb_size, total_z+5], center=true);
        }
        else {
            translate([total_w/-2-cut_margin_l, 0, 0]) cube(size=[total_w, total_h+2, bb_size+5], center=true);
            translate([total_w/-2+cut_margin_r, -total_h+bb_size/2, 0]) cube(size=[total_w, total_h, total_z+5], center=true);
            translate([total_w/-2+cut_margin_r, total_h-bb_size/2, 0]) cube(size=[total_w, total_h, total_z+5], center=true);
        }
        
    }
    
    
    
}

module mounting_hole() {
    cylinder(d=mh_inner_dia, h=bb_size+2, $fn=100);
    cylinder(d=mh_out_dia, h=mh_out_h+1, $fn=100);
    translate([0, 0, bb_size+1-mh_out_h]) cylinder(d=mh_out_dia, h=mh_out_h+1, $fn=100);
}
